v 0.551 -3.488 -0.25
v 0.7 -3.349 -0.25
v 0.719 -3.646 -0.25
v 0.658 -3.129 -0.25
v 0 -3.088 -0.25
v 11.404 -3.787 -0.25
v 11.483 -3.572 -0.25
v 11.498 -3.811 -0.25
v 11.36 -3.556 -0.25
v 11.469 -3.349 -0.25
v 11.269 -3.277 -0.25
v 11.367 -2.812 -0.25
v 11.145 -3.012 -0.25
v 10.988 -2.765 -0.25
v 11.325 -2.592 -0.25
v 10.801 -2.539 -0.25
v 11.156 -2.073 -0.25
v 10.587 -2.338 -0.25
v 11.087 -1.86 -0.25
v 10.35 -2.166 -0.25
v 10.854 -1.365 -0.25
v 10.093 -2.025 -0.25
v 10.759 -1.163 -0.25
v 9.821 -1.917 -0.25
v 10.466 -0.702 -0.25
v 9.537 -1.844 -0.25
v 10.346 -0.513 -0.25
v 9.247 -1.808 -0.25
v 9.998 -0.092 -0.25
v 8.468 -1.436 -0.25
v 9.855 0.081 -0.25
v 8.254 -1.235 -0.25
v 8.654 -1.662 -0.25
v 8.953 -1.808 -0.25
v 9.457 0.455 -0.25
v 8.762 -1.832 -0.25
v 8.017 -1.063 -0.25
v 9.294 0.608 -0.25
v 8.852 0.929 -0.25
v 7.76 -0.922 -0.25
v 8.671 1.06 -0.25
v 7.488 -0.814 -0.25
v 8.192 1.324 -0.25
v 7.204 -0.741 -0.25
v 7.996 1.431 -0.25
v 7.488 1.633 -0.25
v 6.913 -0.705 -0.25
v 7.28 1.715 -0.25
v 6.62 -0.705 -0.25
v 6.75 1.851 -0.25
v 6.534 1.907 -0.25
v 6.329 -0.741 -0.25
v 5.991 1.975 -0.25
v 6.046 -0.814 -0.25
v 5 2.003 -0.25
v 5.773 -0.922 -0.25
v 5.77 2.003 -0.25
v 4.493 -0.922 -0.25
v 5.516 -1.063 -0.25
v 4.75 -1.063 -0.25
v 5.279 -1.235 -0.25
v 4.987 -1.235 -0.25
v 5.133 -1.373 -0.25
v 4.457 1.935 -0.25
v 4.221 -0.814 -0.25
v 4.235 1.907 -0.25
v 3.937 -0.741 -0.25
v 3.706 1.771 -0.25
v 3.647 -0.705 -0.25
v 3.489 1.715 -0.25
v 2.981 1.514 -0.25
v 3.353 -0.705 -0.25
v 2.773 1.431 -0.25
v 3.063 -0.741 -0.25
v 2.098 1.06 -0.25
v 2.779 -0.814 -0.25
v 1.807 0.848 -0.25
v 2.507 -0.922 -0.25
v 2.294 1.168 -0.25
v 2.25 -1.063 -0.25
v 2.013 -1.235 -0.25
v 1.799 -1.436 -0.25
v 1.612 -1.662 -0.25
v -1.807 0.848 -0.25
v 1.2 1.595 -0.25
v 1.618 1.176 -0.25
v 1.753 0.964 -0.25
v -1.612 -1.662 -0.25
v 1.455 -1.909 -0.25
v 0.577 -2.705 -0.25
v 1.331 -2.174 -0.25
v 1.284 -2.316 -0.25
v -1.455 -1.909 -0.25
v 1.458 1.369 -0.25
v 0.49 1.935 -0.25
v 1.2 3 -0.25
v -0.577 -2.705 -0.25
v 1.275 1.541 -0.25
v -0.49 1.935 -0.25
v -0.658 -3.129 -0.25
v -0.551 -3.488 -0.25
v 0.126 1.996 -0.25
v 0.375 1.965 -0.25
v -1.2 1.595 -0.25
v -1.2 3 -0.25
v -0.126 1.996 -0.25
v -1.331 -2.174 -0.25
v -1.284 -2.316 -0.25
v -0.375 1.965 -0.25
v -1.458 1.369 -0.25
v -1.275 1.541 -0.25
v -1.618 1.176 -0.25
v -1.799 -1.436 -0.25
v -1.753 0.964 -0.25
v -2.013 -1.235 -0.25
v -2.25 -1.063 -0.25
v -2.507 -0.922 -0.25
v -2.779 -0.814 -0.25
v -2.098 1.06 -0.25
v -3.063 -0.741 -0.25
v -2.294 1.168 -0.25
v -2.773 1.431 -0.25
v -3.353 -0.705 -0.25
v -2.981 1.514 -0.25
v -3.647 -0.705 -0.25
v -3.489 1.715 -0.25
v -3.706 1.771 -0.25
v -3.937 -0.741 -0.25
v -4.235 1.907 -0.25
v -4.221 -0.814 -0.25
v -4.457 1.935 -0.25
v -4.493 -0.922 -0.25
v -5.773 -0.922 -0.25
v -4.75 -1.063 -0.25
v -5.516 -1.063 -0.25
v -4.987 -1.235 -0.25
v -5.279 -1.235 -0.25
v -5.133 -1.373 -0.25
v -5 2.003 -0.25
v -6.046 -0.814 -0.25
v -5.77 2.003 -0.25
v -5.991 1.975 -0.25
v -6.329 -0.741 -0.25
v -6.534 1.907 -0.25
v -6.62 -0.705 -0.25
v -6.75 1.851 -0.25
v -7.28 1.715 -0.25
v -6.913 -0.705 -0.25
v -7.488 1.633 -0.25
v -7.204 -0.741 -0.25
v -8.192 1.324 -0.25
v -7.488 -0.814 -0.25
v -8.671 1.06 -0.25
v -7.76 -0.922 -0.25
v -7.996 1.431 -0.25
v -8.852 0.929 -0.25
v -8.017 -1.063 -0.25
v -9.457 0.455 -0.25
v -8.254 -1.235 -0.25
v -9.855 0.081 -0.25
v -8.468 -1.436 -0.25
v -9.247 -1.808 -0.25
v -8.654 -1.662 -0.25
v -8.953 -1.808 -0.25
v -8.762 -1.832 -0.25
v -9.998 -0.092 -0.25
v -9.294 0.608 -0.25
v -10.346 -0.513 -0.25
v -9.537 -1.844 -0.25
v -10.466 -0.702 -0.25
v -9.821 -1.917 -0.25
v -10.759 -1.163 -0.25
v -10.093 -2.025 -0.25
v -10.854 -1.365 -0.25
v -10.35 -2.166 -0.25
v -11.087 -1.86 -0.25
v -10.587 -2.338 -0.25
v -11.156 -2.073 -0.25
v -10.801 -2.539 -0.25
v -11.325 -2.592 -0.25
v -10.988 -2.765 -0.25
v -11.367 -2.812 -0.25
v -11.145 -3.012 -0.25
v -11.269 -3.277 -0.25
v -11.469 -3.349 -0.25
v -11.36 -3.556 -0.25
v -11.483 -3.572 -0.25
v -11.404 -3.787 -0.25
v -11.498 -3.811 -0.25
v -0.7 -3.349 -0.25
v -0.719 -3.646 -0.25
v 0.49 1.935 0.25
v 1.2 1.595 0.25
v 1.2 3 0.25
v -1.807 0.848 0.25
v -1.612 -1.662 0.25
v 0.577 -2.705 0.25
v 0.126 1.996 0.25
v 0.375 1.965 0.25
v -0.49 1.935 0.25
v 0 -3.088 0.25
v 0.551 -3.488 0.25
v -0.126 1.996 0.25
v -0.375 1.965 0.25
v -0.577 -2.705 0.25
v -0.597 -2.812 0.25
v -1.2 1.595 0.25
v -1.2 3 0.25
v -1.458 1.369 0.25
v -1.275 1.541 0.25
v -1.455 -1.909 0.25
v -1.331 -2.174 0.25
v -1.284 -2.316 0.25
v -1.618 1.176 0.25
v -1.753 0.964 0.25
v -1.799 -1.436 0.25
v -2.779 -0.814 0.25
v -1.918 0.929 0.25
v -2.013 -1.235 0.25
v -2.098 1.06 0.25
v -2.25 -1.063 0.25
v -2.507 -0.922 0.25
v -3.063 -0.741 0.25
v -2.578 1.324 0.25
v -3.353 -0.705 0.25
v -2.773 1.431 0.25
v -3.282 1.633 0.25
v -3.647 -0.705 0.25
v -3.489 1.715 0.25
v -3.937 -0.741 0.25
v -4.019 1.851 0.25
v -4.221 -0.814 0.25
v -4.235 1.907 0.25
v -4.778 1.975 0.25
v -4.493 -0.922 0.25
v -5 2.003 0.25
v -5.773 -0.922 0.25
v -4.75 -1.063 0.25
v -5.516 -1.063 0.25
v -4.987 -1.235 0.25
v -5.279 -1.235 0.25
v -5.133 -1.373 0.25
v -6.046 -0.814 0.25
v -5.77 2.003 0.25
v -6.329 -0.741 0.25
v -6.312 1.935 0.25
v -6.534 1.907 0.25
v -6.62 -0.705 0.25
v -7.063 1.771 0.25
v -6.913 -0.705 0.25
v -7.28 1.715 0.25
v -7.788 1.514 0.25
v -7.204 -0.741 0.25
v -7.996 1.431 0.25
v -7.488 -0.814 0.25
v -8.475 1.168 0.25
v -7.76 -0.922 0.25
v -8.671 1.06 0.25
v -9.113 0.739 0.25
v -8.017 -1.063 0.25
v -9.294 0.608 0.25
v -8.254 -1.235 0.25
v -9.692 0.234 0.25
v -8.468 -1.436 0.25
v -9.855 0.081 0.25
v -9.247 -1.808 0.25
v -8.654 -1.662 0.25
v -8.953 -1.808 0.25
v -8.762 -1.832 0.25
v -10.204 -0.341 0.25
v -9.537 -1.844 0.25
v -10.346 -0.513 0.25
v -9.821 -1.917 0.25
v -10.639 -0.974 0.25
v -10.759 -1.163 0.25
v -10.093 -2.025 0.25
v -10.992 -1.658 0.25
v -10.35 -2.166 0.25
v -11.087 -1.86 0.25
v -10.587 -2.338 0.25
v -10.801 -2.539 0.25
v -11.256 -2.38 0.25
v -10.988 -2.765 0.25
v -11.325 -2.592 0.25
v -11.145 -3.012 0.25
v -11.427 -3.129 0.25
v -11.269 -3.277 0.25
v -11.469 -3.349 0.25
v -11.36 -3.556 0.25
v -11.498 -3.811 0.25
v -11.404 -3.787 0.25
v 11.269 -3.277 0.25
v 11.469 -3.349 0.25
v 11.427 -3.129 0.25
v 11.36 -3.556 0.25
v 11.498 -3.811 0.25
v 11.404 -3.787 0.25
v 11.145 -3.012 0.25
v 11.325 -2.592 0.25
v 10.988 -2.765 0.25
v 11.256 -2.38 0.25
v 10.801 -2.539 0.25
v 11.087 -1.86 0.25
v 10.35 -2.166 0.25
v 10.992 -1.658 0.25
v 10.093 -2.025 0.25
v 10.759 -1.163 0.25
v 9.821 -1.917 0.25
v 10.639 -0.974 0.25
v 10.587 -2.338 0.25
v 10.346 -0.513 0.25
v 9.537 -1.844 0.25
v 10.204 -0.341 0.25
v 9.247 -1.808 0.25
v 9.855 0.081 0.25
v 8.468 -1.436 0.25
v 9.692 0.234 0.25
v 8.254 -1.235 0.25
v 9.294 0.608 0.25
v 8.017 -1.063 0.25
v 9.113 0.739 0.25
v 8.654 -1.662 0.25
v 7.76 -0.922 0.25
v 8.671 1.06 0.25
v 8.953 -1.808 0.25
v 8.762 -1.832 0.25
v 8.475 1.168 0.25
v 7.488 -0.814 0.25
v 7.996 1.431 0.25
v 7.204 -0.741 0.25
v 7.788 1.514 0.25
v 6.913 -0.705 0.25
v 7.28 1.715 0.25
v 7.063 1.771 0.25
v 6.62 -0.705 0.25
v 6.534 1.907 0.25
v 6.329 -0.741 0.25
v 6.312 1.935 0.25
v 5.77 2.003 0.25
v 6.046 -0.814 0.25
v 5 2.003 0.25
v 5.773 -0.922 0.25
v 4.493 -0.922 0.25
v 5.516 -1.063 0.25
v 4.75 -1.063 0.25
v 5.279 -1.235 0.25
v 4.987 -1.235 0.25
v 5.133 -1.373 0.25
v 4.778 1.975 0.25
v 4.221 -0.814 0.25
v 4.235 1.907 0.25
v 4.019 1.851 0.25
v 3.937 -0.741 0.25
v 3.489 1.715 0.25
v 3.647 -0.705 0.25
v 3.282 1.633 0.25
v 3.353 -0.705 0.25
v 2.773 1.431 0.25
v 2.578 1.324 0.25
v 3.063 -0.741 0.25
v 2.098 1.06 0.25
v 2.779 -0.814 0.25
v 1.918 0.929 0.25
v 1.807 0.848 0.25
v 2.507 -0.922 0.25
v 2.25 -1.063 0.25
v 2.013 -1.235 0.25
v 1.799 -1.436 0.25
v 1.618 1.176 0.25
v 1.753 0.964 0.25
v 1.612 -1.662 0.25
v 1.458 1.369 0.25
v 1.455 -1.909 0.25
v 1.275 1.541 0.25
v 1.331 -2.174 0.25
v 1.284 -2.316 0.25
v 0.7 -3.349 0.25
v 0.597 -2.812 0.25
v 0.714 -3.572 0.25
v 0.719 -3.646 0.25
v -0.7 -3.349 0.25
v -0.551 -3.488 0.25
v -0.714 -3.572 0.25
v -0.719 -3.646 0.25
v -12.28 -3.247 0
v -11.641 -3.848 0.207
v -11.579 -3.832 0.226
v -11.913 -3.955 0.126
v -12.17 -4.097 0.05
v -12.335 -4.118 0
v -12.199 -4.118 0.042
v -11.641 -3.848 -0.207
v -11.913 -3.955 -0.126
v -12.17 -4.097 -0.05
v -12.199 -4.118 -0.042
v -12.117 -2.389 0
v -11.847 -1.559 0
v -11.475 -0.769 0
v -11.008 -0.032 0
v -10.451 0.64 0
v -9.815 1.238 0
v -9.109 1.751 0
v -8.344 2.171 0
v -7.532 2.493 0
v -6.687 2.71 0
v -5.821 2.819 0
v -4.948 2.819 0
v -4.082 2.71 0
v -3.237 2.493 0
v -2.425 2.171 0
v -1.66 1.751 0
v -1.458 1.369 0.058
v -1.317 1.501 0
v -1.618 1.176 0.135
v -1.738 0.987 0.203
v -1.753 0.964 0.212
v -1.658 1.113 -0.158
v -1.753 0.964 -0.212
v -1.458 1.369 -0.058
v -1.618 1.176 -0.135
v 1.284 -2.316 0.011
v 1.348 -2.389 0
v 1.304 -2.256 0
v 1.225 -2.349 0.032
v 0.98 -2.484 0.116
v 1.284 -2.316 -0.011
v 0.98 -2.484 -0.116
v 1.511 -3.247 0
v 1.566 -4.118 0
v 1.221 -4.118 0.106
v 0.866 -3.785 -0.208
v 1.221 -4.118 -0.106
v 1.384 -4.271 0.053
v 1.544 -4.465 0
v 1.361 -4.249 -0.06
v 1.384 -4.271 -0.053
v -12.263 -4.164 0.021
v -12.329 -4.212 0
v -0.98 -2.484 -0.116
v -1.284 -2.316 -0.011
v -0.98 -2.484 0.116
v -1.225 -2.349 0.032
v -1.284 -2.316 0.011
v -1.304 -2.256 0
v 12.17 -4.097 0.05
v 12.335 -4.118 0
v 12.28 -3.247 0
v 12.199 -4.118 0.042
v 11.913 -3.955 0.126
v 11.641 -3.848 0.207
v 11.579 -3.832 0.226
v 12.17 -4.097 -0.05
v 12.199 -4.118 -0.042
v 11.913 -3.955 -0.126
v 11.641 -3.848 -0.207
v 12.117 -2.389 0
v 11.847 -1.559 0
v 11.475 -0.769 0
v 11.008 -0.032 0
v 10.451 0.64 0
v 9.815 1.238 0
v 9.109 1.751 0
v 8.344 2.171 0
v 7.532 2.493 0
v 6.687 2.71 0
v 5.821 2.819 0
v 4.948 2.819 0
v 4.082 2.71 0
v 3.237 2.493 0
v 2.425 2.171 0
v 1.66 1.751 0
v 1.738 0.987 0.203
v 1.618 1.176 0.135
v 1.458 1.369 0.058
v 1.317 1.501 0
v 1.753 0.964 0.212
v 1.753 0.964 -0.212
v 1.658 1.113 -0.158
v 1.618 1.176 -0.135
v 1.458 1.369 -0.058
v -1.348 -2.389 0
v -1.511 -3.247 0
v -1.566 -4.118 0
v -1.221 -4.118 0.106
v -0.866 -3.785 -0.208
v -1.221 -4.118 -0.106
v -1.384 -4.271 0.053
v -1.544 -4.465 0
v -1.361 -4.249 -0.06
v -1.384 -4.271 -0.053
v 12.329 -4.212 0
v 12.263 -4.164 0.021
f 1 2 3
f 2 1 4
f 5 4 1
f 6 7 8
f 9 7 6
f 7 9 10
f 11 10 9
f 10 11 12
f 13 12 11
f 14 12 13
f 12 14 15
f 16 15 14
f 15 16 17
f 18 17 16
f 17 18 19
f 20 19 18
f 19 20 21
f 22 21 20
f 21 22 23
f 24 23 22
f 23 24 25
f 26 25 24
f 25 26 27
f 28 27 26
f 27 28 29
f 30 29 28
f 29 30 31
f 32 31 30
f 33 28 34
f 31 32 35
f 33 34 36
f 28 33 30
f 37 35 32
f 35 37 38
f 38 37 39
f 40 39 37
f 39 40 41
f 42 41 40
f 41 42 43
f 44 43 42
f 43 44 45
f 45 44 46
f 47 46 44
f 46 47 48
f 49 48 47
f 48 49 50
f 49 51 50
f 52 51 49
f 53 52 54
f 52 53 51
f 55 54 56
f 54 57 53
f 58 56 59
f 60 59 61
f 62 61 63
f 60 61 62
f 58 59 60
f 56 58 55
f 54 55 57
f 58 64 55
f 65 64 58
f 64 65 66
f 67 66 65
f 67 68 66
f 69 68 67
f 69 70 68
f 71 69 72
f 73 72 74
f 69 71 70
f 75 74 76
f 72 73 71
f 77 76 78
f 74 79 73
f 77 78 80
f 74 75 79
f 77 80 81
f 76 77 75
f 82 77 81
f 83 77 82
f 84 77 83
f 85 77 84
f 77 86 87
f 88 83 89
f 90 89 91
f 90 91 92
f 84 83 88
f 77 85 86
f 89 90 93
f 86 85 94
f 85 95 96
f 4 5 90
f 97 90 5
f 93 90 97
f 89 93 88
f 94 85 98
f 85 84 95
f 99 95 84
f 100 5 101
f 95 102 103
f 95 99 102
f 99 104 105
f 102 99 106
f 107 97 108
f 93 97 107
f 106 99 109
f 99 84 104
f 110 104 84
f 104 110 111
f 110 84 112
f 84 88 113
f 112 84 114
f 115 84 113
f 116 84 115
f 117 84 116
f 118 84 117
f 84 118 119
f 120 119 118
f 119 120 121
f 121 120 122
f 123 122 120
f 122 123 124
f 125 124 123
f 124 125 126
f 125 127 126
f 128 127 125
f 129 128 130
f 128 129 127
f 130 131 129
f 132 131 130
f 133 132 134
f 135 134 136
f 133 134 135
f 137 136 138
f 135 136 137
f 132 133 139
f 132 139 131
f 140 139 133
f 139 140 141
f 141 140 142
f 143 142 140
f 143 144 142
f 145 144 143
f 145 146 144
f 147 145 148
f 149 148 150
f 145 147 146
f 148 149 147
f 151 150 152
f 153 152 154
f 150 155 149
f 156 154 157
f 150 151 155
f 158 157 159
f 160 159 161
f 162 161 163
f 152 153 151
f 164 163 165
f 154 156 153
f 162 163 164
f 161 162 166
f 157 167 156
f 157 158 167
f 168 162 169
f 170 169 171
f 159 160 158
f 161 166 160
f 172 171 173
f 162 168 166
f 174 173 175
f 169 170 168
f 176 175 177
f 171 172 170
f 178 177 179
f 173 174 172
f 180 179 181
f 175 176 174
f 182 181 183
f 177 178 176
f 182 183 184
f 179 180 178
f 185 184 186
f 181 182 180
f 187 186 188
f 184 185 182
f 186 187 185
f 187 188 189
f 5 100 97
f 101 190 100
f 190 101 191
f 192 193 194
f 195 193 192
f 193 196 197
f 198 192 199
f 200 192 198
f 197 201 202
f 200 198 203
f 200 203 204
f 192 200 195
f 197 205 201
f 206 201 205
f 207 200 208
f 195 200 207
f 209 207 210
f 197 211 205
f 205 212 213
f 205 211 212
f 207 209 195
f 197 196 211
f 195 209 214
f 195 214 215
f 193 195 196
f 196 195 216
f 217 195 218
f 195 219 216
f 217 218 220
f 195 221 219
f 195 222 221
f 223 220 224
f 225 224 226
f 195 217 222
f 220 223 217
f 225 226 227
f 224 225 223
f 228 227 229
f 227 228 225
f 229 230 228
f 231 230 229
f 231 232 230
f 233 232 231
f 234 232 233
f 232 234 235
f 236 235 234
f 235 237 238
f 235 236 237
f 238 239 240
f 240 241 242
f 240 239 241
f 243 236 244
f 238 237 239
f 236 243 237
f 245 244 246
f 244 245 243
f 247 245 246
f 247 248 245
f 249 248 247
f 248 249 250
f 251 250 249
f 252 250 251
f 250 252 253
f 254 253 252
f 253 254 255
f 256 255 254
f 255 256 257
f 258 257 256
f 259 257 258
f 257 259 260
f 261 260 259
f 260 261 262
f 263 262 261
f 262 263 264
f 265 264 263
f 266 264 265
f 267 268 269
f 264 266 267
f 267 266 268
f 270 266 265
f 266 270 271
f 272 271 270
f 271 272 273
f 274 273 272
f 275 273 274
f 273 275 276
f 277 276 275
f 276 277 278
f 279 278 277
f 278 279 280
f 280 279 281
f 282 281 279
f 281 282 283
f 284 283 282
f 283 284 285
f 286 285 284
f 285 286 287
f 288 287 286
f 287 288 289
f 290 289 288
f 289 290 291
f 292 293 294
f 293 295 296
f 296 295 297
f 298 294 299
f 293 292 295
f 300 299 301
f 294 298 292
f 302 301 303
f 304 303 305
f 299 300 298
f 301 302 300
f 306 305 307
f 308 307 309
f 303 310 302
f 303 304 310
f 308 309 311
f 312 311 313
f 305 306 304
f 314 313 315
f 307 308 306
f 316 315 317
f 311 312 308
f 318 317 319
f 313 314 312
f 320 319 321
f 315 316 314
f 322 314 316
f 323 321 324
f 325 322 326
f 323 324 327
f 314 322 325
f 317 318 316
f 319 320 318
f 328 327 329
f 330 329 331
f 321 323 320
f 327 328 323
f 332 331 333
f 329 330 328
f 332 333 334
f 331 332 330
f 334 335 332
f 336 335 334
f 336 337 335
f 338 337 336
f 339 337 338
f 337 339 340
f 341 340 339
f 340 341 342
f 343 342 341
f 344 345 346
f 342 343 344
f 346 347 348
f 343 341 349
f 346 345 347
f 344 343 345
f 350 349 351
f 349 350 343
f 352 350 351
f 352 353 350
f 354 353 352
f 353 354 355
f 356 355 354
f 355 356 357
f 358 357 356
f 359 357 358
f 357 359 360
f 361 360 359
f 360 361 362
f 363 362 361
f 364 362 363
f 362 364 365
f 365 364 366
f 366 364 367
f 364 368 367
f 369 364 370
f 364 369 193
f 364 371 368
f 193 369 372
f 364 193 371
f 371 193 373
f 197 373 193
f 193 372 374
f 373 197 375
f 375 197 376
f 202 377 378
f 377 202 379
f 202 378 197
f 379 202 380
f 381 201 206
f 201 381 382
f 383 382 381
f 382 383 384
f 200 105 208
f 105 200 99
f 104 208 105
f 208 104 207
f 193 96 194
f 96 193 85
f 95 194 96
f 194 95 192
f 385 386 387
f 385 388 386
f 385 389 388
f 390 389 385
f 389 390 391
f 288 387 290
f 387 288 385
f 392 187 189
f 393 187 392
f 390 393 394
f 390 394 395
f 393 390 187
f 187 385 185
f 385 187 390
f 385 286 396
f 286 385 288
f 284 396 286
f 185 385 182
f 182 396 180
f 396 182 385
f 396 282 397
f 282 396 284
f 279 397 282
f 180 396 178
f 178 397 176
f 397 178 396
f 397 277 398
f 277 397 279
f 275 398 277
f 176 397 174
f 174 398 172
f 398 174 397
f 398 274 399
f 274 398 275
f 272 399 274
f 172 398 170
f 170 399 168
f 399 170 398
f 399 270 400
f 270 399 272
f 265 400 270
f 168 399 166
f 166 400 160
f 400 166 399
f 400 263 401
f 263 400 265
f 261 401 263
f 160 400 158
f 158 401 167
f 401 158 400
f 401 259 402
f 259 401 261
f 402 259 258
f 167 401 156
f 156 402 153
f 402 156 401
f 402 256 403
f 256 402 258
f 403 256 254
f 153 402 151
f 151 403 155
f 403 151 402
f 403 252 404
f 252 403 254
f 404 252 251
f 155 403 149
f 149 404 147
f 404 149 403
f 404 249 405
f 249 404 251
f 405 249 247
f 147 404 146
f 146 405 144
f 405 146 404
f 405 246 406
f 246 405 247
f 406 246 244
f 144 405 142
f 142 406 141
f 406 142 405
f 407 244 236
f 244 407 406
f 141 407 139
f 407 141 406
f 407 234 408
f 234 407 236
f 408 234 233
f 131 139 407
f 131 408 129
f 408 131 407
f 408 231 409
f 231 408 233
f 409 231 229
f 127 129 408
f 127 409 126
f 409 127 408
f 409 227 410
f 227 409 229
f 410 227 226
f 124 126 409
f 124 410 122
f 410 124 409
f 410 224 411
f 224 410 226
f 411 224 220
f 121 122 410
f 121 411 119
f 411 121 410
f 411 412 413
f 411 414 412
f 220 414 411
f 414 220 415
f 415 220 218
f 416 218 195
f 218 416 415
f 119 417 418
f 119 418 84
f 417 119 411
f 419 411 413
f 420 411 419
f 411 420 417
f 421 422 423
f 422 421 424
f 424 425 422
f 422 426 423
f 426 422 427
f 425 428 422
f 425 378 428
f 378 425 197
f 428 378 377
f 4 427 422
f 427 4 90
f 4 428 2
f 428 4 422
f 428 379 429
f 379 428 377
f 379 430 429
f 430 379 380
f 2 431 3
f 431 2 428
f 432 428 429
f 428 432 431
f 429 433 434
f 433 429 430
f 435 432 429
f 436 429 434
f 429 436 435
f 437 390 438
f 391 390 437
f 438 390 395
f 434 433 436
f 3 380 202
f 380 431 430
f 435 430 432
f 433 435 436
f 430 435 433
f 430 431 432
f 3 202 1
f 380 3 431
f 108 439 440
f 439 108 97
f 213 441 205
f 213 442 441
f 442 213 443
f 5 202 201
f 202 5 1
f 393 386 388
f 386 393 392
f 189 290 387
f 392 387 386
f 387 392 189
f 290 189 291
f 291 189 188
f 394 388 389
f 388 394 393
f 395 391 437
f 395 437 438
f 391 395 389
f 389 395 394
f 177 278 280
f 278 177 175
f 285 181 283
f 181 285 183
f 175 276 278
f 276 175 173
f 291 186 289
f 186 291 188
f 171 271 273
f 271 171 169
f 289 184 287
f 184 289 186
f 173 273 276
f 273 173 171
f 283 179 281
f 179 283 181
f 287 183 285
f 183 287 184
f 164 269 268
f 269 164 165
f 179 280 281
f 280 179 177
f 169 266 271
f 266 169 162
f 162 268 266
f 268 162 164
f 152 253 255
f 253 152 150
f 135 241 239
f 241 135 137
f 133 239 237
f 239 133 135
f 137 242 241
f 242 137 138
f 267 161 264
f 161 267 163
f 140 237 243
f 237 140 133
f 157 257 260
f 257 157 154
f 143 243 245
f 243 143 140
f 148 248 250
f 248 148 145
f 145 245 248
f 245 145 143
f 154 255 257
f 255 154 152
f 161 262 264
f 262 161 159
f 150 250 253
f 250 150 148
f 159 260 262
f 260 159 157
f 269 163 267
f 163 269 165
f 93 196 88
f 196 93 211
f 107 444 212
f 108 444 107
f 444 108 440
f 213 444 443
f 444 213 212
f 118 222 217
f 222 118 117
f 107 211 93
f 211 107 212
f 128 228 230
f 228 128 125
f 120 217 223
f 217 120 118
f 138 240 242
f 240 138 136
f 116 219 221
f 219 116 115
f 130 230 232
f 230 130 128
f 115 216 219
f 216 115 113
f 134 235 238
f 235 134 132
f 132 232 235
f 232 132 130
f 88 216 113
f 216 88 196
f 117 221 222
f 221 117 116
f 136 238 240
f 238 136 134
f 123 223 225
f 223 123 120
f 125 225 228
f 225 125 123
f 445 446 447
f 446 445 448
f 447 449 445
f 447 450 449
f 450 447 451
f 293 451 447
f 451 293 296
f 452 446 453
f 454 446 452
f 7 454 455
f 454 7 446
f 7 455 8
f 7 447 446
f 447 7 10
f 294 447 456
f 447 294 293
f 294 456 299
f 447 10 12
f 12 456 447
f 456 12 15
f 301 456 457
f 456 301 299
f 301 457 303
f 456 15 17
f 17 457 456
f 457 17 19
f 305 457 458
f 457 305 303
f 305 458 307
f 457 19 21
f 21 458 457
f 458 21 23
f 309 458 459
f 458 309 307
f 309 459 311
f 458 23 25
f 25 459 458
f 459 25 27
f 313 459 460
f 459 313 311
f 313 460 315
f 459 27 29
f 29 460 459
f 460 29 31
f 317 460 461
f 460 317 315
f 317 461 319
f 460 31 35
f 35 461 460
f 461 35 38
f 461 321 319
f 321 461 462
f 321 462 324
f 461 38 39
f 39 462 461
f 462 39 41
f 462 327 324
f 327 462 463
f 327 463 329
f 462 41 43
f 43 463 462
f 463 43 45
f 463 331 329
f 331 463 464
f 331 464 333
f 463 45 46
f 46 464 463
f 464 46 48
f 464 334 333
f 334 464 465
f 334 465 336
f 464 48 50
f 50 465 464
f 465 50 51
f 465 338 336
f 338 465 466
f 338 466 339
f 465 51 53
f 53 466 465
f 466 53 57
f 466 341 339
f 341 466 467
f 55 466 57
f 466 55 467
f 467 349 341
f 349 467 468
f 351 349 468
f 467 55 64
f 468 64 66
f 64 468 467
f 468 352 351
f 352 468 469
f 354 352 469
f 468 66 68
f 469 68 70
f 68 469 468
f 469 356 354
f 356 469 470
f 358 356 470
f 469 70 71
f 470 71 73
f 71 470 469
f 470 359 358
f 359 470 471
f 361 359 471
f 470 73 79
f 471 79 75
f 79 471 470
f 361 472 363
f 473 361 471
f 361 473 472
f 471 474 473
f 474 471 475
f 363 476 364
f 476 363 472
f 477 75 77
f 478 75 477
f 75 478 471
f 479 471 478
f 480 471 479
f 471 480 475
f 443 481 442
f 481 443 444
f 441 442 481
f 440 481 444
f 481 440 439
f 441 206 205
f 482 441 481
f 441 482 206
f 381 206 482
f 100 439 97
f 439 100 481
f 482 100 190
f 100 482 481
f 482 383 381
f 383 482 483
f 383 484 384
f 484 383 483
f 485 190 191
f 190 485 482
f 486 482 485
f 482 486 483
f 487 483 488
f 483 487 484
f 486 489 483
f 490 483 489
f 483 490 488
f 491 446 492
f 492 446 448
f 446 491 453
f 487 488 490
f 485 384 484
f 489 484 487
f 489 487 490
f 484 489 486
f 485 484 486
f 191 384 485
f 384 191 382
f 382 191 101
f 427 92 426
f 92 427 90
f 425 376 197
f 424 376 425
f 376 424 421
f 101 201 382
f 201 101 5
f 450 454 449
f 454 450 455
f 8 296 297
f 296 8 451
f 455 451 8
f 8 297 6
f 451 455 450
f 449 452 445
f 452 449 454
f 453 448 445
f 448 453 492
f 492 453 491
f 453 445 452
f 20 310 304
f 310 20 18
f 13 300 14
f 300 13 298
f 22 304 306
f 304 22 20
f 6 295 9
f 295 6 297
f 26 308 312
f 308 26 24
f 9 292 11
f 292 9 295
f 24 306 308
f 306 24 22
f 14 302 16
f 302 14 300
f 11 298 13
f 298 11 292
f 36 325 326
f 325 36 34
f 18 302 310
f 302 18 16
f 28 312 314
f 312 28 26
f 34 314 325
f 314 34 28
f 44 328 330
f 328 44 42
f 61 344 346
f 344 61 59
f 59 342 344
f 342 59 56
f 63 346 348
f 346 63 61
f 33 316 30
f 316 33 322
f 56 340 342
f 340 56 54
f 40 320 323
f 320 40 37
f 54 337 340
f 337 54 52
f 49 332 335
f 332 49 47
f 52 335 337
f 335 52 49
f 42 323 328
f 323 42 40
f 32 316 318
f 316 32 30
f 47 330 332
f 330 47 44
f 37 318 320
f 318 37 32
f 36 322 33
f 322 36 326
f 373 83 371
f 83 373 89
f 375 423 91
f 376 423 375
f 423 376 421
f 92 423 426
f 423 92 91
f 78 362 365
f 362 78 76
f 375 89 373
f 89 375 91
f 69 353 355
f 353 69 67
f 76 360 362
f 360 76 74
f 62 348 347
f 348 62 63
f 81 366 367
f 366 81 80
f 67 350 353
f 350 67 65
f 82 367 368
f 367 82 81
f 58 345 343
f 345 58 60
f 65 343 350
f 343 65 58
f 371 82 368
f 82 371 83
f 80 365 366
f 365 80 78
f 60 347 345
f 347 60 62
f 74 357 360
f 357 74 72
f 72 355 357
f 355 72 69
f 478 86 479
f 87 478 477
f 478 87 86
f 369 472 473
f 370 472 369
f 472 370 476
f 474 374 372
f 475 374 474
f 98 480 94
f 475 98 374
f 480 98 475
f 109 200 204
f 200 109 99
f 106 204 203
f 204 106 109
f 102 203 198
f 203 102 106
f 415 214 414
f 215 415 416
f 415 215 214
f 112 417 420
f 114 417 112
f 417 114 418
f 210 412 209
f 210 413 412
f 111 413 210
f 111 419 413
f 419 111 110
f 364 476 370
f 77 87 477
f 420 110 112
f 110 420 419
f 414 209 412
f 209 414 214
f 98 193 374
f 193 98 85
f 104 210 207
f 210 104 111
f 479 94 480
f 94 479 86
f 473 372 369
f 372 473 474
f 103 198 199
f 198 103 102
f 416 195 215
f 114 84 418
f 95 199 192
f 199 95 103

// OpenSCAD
T = 0.5; // Thickness

N = 50; // Polygon Count

CR = 2; // Center Radius
WR = 7; // wing radius
WCX = -WR/1.3; // Wing Coordinate x
WCY = -WR/1.7;
DK = 0.75*WR; // idk
RR=WR/3;
IRX = WR*1.3; // outermost
IIRX = IRX-RR; // middle
IIIRX = WR/2; // innermost
WRR = WR*1.3; // Wing removal radius

module copy_mirror(vec=[1,0,0])
{
    children();
    mirror(vec) children();
}

cylinder(T,CR,CR,center=true,$fn=N);

// EARS
copy_mirror([1,0,0])
    linear_extrude(T,center=true)
        polygon(points=[[-0.2,1.5],[-1.2,1.5],[-1.2,3]]);

copy_mirror([1,0,0]) difference(){
    // LARGER CIRCLE WING
    union(){
        translate([WCX,WCY,0])
            cylinder(T,WR,WR,center=true,$fn=N);
        
    }

    // BLADED EDGE
    translate([WCX,WCY,0])
    rotate_extrude(convexity = N,$fn=N)
    translate([WR+.1, 0, 0])
        rotate([0,0,-90])
        union(){
            translate([-1,0,0])rotate([0,0,-17])square(2,center=true);
            translate([1,0,0])rotate([0,0,17])square(2,center=true);
    //}
}
    // WING REMOVAL
    translate([-DK,-2*DK,0])
        cylinder(T*2,WRR,WRR,center=true,$fn=N);
        
    // FINS
    translate([-IRX*1.2,-WRR/1.5,0])
        cylinder(T*2,RR,RR,center=true,$fn=N);
    translate([-IRX,-WRR/2.2,0])
        cylinder(T*2,RR,RR,center=true,$fn=N);
    translate([-IIRX,-WRR/3,0])
        cylinder(T*2,RR,RR,center=true,$fn=N);
    translate([-IIIRX,-WRR/3,0])
        cylinder(T*2,RR,RR,center=true,$fn=N);
}



//rotate_extrude(convexity = N,$fn=N)
//translate([WR, 0, 0])
//    rotate([0,0,-90])union(){
    //translate([-1,0,0])rotate([0,0,-22.5])square(2,center=true);
    //translate([1,0,0])rotate([0,0,22.5])square(2,center=true);
//}

//rotate_extrude(convexity = 10, $fn = 100)
//translate([2, 0, 0])
//square(1);

//probe(volume=true) {
//   batarang(); // the thing to measure
//    echo("volume=",volume," centroid=",centroid);
//    %thing();
//    color("red") translate(centroid) sphere(r=1,$fn=32);
//} 
